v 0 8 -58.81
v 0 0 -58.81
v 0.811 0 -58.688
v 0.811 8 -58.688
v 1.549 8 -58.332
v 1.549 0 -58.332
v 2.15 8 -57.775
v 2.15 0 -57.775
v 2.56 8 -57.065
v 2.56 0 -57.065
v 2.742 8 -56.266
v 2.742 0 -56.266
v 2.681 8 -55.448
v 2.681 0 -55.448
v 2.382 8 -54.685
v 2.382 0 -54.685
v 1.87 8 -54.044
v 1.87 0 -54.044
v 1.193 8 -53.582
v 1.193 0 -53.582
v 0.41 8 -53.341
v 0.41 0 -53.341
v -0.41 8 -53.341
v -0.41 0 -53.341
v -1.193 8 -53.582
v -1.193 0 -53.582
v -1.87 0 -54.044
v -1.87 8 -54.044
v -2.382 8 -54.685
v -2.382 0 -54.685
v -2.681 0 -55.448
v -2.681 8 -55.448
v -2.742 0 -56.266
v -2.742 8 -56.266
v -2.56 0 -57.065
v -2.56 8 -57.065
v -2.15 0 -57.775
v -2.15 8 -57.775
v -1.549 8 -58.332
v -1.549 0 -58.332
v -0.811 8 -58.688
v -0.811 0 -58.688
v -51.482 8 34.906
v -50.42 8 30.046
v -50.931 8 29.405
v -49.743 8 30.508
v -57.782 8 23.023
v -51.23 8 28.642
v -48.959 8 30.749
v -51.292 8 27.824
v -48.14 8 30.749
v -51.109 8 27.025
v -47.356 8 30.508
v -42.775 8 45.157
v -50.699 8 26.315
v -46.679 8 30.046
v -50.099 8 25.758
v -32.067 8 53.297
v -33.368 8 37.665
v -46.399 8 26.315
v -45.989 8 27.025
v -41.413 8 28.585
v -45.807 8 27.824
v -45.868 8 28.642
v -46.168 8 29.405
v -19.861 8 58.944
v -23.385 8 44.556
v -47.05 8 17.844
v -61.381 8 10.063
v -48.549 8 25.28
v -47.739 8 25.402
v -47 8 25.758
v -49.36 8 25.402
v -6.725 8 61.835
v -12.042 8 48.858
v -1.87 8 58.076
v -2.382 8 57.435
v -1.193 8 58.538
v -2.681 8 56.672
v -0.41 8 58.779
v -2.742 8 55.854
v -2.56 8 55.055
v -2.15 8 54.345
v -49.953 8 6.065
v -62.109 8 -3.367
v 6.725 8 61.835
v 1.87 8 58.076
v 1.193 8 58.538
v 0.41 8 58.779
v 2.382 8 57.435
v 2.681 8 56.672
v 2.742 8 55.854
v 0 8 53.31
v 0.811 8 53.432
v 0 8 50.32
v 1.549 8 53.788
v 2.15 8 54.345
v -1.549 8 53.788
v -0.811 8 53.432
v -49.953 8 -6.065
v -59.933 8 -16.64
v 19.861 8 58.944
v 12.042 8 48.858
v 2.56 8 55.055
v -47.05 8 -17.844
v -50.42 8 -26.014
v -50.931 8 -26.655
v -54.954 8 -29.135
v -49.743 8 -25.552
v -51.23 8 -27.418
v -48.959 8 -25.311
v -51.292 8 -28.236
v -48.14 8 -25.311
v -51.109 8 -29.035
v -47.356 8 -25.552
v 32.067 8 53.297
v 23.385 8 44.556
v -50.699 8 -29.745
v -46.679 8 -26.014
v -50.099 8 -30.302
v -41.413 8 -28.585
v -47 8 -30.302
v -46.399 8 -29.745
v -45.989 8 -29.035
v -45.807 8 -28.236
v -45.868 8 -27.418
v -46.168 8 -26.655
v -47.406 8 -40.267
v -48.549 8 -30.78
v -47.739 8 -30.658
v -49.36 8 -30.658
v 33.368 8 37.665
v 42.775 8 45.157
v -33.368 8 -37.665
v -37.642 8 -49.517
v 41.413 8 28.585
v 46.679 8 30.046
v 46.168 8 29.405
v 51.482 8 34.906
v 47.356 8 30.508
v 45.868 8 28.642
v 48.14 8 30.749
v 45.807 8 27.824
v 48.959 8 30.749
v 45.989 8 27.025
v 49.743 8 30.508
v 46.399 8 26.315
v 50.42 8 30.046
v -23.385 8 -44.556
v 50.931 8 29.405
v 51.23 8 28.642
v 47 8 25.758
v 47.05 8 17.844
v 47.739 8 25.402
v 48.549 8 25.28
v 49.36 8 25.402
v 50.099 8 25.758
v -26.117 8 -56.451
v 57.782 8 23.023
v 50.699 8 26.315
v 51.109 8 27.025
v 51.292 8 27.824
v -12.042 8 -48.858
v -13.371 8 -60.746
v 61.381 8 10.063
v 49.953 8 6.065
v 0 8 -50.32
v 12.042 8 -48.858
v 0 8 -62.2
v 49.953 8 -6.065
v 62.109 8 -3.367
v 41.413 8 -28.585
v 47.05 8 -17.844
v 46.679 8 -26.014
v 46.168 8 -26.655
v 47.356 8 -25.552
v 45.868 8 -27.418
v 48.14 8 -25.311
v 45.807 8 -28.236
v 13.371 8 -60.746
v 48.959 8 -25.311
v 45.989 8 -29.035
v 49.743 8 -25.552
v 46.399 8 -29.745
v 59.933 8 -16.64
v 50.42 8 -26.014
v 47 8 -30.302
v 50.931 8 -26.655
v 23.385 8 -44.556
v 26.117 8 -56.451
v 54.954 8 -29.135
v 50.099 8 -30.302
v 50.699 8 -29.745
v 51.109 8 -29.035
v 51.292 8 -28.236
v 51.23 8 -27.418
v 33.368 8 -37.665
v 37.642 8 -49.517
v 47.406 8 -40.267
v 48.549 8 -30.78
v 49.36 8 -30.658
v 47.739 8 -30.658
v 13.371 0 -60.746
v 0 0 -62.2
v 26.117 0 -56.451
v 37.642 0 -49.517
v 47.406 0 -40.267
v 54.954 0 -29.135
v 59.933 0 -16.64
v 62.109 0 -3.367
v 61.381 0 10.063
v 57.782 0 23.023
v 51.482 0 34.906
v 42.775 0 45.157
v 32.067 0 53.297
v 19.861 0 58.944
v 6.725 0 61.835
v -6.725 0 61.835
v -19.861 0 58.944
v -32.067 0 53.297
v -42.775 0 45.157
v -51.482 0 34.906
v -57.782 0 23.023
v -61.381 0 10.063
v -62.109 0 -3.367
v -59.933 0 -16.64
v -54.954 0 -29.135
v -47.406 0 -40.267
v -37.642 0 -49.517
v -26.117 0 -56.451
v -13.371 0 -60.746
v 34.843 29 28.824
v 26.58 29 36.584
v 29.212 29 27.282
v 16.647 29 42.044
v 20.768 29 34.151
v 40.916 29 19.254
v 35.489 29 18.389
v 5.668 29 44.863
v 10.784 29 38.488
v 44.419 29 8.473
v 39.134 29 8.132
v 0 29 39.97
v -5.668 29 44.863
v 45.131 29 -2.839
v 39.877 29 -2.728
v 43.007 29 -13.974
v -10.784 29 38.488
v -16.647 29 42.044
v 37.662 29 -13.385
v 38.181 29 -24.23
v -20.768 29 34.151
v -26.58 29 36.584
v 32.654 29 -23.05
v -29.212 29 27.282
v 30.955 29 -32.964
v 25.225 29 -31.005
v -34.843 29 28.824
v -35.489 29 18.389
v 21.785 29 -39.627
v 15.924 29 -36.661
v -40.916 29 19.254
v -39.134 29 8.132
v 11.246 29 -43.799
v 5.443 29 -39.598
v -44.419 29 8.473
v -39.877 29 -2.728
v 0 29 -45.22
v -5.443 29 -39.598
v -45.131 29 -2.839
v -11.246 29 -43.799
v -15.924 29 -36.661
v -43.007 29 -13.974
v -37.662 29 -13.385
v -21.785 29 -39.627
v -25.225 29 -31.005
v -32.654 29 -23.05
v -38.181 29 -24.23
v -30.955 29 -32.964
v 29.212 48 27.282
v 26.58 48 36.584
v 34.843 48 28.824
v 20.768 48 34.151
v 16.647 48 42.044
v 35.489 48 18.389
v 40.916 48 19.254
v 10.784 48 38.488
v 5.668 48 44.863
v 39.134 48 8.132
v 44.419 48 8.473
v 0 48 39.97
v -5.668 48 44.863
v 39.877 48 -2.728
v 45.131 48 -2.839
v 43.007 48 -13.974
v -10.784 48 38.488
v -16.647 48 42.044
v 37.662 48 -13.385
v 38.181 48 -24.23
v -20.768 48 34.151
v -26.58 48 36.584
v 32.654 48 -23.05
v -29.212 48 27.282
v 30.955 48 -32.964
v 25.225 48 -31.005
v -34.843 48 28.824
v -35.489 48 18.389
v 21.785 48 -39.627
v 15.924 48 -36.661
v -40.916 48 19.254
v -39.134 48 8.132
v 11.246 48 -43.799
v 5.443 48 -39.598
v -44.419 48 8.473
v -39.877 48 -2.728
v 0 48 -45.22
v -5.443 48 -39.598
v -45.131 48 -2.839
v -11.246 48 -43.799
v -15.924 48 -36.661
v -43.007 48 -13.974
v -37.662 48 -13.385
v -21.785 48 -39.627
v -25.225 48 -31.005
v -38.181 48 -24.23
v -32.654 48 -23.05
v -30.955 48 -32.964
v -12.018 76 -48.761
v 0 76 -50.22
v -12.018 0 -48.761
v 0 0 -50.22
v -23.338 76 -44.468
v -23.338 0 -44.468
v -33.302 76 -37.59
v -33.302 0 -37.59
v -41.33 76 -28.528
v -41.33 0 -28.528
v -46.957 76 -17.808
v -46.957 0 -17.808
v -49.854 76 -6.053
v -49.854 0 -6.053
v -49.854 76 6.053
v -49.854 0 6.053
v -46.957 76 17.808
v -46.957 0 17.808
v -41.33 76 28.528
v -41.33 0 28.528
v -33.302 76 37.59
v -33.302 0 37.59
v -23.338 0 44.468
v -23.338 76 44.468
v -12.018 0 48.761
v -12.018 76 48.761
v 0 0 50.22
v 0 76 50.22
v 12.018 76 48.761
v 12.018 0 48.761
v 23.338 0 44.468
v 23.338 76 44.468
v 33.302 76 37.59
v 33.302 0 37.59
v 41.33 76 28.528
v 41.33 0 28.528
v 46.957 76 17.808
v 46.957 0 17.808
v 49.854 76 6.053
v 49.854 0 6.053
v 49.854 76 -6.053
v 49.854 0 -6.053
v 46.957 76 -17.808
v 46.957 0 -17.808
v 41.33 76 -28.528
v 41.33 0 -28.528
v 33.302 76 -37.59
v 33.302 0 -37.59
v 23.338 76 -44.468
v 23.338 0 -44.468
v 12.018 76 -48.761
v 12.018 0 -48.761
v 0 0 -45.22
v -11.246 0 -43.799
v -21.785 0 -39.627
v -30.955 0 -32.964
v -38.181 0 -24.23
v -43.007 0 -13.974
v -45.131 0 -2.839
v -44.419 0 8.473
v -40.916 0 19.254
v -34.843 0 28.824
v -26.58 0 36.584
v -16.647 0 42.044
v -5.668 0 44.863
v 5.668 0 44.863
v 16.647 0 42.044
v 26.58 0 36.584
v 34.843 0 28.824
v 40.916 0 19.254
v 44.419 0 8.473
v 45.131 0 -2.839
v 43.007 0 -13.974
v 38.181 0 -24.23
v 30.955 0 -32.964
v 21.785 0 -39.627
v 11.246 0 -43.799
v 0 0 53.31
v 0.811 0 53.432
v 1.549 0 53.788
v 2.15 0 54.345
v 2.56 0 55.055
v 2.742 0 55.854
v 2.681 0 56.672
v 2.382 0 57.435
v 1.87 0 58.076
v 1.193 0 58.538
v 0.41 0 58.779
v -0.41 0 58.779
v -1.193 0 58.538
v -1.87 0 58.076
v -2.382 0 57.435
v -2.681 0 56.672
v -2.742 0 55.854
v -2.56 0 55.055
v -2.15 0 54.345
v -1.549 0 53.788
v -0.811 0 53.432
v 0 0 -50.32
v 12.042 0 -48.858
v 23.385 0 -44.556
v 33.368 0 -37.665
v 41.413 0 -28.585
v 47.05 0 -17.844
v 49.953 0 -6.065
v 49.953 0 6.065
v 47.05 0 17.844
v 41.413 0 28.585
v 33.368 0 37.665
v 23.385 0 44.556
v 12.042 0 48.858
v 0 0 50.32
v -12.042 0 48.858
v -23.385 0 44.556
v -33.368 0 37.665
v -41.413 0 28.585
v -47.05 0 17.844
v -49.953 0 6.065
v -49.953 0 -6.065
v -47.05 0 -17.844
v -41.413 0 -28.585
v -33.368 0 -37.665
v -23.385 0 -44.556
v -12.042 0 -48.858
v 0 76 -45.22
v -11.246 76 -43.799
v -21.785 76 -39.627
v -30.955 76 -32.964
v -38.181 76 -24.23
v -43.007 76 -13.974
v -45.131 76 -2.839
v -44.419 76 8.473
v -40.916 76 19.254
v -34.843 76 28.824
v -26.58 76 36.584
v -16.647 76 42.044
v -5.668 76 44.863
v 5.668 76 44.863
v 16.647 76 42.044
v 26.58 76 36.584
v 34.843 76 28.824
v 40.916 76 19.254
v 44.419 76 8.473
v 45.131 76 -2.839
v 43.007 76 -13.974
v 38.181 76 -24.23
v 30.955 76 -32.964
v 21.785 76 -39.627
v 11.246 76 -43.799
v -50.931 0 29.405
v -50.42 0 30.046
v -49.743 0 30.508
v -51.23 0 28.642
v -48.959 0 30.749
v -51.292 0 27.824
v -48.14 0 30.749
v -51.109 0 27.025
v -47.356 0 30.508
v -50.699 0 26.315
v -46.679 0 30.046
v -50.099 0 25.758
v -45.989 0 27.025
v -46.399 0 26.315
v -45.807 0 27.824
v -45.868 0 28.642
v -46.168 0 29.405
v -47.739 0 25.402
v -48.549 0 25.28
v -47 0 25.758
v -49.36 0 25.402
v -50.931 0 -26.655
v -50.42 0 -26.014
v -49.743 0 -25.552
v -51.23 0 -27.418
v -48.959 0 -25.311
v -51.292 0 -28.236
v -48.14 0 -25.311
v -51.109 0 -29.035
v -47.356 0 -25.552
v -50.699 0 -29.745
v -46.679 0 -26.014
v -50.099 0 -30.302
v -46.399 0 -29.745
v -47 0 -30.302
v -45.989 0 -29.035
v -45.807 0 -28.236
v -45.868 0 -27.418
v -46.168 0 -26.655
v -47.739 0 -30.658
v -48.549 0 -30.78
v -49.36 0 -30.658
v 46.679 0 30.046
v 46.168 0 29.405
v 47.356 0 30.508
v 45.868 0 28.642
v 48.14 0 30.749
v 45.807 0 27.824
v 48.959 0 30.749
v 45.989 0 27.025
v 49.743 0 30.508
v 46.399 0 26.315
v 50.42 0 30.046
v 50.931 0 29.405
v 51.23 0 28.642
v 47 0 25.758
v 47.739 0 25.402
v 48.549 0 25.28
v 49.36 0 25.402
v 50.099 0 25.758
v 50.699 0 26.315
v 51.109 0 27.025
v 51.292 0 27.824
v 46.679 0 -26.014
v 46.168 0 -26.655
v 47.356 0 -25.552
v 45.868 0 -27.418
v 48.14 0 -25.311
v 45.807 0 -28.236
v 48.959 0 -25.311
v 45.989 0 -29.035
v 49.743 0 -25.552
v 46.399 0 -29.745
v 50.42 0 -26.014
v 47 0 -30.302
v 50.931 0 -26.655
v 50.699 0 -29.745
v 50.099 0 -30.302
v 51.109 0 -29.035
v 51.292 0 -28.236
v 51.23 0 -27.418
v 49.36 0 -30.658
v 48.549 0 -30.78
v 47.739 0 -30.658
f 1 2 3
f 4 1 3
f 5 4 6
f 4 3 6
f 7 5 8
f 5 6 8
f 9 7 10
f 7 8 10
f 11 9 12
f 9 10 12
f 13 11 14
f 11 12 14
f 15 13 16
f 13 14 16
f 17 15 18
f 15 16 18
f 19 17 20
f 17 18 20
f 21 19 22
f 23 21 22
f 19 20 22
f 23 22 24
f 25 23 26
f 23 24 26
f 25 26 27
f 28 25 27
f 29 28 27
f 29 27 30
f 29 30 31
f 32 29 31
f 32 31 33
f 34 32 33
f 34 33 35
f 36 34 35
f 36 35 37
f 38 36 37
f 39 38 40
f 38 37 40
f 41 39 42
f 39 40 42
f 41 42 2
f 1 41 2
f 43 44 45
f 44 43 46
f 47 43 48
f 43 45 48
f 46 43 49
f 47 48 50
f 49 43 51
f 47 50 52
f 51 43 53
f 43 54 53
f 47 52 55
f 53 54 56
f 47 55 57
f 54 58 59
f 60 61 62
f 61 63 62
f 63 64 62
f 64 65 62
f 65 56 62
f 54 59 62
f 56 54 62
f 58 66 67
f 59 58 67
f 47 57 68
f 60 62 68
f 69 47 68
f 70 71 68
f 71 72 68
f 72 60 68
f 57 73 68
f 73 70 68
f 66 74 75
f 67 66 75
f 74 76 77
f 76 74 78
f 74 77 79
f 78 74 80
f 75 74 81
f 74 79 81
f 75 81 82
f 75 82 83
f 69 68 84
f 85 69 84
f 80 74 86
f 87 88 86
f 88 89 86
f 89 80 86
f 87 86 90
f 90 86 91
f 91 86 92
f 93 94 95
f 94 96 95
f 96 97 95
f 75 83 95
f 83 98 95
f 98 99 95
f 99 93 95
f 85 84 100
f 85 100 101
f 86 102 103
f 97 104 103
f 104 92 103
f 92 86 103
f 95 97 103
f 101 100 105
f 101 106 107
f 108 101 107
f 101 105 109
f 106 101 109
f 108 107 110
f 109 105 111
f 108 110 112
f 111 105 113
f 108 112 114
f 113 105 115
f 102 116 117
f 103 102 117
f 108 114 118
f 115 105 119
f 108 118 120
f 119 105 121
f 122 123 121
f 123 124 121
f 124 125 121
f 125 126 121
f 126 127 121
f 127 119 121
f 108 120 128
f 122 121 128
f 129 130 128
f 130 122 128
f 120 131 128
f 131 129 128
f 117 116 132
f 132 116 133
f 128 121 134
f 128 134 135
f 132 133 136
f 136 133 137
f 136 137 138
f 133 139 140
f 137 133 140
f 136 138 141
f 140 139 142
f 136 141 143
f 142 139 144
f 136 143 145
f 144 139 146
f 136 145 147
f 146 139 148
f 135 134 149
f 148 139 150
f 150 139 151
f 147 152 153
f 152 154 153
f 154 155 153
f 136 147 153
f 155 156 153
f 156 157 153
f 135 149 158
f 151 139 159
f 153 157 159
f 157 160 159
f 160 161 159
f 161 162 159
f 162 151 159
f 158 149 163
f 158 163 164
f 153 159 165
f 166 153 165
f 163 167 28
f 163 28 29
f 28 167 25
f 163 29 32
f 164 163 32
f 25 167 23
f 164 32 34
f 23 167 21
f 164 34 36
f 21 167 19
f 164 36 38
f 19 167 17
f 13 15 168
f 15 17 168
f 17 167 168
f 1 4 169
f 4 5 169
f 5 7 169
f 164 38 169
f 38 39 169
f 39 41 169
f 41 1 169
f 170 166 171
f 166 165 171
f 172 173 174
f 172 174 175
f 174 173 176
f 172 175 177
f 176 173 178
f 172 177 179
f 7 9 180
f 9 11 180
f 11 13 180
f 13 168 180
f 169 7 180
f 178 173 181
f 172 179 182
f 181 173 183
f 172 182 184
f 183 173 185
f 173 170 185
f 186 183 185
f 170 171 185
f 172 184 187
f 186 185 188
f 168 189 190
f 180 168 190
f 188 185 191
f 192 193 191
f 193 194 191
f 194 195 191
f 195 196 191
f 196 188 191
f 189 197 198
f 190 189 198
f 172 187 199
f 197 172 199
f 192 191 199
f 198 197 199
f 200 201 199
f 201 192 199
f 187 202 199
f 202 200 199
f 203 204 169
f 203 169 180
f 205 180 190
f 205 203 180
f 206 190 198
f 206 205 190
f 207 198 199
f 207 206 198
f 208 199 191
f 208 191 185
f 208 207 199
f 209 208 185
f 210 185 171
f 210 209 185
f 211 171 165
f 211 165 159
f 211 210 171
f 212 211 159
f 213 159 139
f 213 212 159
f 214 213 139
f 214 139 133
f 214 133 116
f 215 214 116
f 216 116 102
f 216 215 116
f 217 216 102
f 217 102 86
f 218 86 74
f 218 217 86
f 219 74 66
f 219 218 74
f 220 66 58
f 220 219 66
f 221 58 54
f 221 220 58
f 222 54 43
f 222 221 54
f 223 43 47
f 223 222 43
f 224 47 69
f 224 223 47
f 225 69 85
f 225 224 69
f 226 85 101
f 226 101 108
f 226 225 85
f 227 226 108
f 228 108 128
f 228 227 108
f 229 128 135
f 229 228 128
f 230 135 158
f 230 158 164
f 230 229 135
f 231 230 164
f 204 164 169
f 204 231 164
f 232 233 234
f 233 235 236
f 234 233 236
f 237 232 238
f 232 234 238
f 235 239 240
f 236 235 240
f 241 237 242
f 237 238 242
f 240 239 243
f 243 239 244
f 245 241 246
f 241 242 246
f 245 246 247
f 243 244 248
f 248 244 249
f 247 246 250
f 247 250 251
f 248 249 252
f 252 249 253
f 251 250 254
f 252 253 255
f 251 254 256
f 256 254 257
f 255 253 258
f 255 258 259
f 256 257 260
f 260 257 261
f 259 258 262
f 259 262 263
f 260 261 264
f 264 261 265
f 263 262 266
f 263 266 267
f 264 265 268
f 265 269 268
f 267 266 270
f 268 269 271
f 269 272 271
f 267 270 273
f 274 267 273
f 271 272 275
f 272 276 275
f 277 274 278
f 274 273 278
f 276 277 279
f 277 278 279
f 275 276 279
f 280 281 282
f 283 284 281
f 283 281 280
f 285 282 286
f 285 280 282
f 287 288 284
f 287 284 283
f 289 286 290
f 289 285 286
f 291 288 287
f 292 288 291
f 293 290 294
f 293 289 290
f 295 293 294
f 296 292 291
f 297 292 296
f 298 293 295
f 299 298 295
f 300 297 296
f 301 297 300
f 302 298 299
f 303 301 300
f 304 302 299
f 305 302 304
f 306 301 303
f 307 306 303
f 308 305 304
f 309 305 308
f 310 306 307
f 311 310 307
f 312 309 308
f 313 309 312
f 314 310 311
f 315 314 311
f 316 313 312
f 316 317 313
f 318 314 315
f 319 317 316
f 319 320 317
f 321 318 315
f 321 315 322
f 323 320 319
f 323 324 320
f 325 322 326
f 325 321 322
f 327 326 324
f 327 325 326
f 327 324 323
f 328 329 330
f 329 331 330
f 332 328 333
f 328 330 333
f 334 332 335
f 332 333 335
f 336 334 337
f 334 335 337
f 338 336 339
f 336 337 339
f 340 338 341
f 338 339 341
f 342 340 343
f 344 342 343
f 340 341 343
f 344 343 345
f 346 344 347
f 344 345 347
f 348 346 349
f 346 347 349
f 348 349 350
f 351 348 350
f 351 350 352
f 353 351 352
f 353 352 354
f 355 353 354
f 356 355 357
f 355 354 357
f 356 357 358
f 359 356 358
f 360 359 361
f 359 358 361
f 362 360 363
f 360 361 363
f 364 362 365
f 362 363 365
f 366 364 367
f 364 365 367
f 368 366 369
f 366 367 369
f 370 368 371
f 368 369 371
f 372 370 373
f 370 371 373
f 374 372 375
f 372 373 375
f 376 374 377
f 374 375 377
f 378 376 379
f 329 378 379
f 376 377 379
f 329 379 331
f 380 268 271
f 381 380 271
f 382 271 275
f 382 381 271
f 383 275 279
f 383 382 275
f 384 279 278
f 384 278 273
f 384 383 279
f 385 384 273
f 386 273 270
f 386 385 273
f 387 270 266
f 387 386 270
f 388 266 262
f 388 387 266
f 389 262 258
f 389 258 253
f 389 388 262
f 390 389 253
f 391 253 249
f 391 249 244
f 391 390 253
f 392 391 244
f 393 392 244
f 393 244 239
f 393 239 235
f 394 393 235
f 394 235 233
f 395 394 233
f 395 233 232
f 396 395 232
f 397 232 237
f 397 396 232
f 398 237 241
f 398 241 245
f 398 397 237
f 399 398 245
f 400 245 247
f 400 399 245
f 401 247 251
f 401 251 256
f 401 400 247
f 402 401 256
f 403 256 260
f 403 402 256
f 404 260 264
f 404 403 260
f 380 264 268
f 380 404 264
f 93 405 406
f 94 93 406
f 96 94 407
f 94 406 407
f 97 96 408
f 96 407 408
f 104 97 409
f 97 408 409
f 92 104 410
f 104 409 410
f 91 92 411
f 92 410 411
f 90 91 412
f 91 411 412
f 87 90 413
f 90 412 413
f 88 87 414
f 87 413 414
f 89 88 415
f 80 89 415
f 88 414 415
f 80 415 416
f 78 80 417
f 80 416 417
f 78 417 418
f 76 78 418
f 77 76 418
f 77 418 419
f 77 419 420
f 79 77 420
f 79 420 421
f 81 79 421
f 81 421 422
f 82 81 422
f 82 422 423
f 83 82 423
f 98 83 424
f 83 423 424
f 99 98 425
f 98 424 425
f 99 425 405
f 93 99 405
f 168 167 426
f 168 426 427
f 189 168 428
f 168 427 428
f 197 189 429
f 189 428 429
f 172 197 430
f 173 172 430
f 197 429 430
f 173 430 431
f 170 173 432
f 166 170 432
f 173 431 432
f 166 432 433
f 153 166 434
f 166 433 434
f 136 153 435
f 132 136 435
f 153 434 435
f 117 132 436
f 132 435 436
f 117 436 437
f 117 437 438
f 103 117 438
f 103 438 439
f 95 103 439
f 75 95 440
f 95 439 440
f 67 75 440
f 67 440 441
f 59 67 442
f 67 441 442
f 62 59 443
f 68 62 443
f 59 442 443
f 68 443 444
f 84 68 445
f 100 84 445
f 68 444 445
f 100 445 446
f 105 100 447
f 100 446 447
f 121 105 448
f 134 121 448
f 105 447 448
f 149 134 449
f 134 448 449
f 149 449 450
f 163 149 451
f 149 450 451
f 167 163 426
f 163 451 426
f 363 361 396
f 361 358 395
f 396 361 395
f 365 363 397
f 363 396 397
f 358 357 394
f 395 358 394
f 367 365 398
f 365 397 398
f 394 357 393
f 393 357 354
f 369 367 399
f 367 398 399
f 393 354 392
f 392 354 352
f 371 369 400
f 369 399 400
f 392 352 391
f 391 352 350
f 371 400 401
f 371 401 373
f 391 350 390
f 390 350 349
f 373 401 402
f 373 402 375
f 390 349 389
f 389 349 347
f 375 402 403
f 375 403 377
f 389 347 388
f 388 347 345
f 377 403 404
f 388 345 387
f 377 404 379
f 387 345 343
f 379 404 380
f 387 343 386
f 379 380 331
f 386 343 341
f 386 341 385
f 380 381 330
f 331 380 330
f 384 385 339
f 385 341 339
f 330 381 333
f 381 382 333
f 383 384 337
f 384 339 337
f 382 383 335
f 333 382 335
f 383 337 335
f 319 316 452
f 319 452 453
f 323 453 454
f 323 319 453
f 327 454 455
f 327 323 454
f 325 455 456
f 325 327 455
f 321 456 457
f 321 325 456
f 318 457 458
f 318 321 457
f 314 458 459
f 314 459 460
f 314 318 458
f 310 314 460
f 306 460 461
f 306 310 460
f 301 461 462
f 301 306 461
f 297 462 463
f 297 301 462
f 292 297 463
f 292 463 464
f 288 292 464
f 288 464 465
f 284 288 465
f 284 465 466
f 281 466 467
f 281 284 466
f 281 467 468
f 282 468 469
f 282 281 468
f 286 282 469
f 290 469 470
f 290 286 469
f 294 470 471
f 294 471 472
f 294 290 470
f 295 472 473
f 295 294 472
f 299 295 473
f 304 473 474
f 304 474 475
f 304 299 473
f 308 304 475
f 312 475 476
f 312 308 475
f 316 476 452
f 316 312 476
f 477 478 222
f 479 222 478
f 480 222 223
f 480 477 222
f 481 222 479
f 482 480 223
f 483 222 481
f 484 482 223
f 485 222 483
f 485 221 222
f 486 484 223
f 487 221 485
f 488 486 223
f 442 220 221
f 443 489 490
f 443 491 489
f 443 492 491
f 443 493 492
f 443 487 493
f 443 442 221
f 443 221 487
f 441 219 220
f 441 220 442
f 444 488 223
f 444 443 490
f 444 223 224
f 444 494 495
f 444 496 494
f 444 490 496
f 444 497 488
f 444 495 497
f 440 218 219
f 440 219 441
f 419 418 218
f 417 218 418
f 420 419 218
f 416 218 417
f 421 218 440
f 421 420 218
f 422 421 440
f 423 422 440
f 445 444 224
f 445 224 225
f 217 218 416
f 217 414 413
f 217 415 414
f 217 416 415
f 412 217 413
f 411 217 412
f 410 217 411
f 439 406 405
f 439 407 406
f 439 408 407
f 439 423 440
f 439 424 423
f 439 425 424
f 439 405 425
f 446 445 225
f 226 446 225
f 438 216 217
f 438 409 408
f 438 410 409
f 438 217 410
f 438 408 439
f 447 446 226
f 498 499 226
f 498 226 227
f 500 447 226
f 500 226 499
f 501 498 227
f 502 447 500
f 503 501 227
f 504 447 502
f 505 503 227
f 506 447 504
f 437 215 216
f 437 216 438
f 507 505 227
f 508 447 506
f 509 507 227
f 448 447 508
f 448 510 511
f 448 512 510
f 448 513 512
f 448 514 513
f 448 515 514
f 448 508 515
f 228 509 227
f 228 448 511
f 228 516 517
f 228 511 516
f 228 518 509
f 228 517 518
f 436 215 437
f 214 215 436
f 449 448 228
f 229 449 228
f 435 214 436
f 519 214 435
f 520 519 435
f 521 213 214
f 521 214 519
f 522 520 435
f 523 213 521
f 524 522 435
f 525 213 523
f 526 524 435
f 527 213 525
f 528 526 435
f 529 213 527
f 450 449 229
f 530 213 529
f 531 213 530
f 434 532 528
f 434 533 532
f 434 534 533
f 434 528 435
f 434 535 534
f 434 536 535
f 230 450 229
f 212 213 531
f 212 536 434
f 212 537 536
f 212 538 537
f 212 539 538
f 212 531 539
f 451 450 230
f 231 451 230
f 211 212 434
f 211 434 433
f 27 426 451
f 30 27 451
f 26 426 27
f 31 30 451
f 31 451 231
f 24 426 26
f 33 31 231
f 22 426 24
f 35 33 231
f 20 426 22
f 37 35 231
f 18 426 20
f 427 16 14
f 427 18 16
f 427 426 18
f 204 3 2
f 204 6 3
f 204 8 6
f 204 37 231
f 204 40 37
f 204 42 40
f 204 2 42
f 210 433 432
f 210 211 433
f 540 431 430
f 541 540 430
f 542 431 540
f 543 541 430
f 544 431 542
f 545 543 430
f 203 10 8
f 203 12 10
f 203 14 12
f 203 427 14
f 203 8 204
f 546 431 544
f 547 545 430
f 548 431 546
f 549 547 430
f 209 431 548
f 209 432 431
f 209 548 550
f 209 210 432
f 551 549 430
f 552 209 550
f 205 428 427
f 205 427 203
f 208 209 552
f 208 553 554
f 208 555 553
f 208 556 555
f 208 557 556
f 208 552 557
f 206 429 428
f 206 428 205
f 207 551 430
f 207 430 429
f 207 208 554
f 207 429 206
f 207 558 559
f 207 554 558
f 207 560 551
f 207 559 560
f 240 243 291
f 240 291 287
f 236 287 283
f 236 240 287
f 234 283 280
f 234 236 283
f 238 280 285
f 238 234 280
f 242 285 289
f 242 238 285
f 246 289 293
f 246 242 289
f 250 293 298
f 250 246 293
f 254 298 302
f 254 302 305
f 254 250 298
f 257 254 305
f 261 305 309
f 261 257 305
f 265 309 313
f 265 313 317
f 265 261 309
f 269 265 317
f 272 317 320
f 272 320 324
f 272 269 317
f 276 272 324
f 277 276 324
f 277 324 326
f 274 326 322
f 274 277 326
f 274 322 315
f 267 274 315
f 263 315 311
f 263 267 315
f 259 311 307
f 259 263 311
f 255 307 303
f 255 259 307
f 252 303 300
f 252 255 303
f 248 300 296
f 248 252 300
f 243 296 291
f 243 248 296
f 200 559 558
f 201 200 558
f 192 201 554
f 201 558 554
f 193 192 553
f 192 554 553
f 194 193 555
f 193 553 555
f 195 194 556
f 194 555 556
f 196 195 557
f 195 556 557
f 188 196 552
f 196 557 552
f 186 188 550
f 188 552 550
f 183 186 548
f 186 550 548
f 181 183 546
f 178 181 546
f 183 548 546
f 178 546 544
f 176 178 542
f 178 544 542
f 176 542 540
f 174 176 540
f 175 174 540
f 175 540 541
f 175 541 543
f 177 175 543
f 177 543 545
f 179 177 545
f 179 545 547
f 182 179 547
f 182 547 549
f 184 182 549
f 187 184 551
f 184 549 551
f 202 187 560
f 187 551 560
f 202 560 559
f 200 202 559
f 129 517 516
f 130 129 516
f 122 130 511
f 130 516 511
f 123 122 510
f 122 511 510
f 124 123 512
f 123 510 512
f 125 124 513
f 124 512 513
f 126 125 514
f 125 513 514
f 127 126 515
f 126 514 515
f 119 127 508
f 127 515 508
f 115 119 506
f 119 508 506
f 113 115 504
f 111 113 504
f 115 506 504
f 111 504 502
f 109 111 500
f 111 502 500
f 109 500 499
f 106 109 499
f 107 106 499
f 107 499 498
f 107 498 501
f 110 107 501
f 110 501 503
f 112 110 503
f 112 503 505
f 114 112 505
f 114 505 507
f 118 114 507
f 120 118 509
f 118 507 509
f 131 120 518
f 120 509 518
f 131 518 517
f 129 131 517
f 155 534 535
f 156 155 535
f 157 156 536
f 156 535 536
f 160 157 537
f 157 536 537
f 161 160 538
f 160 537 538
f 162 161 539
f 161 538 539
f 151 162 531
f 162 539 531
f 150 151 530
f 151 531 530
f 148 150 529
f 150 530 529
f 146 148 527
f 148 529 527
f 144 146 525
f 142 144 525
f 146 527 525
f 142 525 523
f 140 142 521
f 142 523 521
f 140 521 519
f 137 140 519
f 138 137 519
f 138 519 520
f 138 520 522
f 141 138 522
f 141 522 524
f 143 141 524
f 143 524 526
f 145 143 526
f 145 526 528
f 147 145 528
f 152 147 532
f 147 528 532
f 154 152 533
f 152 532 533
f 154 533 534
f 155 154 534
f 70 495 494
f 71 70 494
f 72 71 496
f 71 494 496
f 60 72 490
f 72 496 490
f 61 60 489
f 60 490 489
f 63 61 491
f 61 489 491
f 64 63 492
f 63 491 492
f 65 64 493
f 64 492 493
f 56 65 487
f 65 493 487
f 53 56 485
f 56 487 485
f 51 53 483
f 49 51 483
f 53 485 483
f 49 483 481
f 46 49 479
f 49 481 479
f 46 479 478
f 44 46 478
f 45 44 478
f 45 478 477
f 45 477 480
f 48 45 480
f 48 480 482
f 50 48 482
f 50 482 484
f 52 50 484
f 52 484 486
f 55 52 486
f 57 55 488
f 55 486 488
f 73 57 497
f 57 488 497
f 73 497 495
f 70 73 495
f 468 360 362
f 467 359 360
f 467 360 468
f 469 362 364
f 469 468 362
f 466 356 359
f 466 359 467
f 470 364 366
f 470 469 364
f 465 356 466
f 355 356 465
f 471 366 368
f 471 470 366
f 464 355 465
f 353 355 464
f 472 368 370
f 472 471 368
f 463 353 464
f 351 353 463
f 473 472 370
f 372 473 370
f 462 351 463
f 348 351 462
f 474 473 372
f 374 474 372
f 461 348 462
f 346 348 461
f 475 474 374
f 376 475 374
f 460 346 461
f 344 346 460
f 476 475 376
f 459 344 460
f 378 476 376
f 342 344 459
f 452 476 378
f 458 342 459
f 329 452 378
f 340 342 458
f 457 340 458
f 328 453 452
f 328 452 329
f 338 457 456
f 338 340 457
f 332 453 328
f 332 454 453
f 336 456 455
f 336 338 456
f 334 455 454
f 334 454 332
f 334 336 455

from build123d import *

# Parameters (mm, degrees)
SKETCH2_R           = 50.22
SKETCH2_R_2         = 45.22
BOSS_EXTRUDE1_DEPTH = 29
SKETCH3_R           = 50.22
SKETCH3_R_2         = 45.22
SKETCH3_R_3         = 39.97
BOSS_EXTRUDE2_DEPTH = 19
SKETCH4_R           = 50.22
SKETCH4_R_2         = 45.22
BOSS_EXTRUDE3_DEPTH = 28
SKETCH6_R           = 62.2
SKETCH6_R_2         = 50.32
SKETCH6_R_3         = 2.75
BOSS_EXTRUDE4_DEPTH = 8


with BuildPart() as part:
    # Sketch2 → Boss-Extrude1 (new body)
    with BuildSketch(Plane(origin=(0, 0, 0), x_dir=(1, 0, 0), z_dir=(0, 1, 0))):
        with Locations(Location((0, 0, 0), (0, 0, 90))):
            Circle(SKETCH2_R)
        with Locations(Location((0, 0, 0), (0, 0, 90))):
            Circle(SKETCH2_R_2, mode=Mode.SUBTRACT)
    extrude(amount=BOSS_EXTRUDE1_DEPTH)

    # Sketch3 → Boss-Extrude2 (add)
    with BuildSketch(Plane(origin=(0, 29, 0), x_dir=(1, 0, 0), z_dir=(0, 1, 0))):
        with Locations(Location((0, 0, 0), (0, 0, 90))):
            Circle(SKETCH3_R)
        with Locations(Location((0, 0, 0), (0, 0, 90))):
            Circle(SKETCH3_R_2, mode=Mode.SUBTRACT)
        with Locations(Location((0, 0, 0), (0, 0, 90))):
            Circle(SKETCH3_R_2)
        with Locations(Location((0, 0, 0), (0, 0, 270))):
            Circle(SKETCH3_R_3, mode=Mode.SUBTRACT)
    extrude(amount=BOSS_EXTRUDE2_DEPTH)

    # Sketch4 → Boss-Extrude3 (add)
    with BuildSketch(Plane(origin=(0, 48, 0), x_dir=(1, 0, 0), z_dir=(0, 1, 0))):
        with Locations(Location((0, 0, 0), (0, 0, 90))):
            Circle(SKETCH4_R)
        with Locations(Location((0, 0, 0), (0, 0, 90))):
            Circle(SKETCH4_R_2, mode=Mode.SUBTRACT)
    extrude(amount=BOSS_EXTRUDE3_DEPTH)


with BuildPart() as body_2:
    # Sketch6 → Boss-Extrude4 (new body)
    with BuildSketch(Plane.XZ):
        with Locations(Location((0, 0, 0), (0, 0, 270))):
            Circle(SKETCH6_R)
        with Locations(Location((0, 0, 0), (0, 0, 270))):
            Circle(SKETCH6_R_2, mode=Mode.SUBTRACT)
        with Locations(Location((0, 56.06, 0), (0, 0, 270))):
            Circle(SKETCH6_R_3, mode=Mode.SUBTRACT)
        with Locations(Location((-48.549384136, 28.03, 0), (0, 0, 270))):
            Circle(SKETCH6_R_3, mode=Mode.SUBTRACT)
        with Locations(Location((-48.549384136, -28.03, 0), (0, 0, 270))):
            Circle(SKETCH6_R_3, mode=Mode.SUBTRACT)
        with Locations(Location((48.549384136, 28.03, 0), (0, 0, 270))):
            Circle(SKETCH6_R_3, mode=Mode.SUBTRACT)
        with Locations(Location((48.549384136, -28.03, 0), (0, 0, 270))):
            Circle(SKETCH6_R_3, mode=Mode.SUBTRACT)
        with Locations(Location((0, -56.06, 0), (0, 0, 270))):
            Circle(SKETCH6_R_3, mode=Mode.SUBTRACT)
    extrude(amount=-BOSS_EXTRUDE4_DEPTH)


solid = Compound([part.part, body_2.part])
